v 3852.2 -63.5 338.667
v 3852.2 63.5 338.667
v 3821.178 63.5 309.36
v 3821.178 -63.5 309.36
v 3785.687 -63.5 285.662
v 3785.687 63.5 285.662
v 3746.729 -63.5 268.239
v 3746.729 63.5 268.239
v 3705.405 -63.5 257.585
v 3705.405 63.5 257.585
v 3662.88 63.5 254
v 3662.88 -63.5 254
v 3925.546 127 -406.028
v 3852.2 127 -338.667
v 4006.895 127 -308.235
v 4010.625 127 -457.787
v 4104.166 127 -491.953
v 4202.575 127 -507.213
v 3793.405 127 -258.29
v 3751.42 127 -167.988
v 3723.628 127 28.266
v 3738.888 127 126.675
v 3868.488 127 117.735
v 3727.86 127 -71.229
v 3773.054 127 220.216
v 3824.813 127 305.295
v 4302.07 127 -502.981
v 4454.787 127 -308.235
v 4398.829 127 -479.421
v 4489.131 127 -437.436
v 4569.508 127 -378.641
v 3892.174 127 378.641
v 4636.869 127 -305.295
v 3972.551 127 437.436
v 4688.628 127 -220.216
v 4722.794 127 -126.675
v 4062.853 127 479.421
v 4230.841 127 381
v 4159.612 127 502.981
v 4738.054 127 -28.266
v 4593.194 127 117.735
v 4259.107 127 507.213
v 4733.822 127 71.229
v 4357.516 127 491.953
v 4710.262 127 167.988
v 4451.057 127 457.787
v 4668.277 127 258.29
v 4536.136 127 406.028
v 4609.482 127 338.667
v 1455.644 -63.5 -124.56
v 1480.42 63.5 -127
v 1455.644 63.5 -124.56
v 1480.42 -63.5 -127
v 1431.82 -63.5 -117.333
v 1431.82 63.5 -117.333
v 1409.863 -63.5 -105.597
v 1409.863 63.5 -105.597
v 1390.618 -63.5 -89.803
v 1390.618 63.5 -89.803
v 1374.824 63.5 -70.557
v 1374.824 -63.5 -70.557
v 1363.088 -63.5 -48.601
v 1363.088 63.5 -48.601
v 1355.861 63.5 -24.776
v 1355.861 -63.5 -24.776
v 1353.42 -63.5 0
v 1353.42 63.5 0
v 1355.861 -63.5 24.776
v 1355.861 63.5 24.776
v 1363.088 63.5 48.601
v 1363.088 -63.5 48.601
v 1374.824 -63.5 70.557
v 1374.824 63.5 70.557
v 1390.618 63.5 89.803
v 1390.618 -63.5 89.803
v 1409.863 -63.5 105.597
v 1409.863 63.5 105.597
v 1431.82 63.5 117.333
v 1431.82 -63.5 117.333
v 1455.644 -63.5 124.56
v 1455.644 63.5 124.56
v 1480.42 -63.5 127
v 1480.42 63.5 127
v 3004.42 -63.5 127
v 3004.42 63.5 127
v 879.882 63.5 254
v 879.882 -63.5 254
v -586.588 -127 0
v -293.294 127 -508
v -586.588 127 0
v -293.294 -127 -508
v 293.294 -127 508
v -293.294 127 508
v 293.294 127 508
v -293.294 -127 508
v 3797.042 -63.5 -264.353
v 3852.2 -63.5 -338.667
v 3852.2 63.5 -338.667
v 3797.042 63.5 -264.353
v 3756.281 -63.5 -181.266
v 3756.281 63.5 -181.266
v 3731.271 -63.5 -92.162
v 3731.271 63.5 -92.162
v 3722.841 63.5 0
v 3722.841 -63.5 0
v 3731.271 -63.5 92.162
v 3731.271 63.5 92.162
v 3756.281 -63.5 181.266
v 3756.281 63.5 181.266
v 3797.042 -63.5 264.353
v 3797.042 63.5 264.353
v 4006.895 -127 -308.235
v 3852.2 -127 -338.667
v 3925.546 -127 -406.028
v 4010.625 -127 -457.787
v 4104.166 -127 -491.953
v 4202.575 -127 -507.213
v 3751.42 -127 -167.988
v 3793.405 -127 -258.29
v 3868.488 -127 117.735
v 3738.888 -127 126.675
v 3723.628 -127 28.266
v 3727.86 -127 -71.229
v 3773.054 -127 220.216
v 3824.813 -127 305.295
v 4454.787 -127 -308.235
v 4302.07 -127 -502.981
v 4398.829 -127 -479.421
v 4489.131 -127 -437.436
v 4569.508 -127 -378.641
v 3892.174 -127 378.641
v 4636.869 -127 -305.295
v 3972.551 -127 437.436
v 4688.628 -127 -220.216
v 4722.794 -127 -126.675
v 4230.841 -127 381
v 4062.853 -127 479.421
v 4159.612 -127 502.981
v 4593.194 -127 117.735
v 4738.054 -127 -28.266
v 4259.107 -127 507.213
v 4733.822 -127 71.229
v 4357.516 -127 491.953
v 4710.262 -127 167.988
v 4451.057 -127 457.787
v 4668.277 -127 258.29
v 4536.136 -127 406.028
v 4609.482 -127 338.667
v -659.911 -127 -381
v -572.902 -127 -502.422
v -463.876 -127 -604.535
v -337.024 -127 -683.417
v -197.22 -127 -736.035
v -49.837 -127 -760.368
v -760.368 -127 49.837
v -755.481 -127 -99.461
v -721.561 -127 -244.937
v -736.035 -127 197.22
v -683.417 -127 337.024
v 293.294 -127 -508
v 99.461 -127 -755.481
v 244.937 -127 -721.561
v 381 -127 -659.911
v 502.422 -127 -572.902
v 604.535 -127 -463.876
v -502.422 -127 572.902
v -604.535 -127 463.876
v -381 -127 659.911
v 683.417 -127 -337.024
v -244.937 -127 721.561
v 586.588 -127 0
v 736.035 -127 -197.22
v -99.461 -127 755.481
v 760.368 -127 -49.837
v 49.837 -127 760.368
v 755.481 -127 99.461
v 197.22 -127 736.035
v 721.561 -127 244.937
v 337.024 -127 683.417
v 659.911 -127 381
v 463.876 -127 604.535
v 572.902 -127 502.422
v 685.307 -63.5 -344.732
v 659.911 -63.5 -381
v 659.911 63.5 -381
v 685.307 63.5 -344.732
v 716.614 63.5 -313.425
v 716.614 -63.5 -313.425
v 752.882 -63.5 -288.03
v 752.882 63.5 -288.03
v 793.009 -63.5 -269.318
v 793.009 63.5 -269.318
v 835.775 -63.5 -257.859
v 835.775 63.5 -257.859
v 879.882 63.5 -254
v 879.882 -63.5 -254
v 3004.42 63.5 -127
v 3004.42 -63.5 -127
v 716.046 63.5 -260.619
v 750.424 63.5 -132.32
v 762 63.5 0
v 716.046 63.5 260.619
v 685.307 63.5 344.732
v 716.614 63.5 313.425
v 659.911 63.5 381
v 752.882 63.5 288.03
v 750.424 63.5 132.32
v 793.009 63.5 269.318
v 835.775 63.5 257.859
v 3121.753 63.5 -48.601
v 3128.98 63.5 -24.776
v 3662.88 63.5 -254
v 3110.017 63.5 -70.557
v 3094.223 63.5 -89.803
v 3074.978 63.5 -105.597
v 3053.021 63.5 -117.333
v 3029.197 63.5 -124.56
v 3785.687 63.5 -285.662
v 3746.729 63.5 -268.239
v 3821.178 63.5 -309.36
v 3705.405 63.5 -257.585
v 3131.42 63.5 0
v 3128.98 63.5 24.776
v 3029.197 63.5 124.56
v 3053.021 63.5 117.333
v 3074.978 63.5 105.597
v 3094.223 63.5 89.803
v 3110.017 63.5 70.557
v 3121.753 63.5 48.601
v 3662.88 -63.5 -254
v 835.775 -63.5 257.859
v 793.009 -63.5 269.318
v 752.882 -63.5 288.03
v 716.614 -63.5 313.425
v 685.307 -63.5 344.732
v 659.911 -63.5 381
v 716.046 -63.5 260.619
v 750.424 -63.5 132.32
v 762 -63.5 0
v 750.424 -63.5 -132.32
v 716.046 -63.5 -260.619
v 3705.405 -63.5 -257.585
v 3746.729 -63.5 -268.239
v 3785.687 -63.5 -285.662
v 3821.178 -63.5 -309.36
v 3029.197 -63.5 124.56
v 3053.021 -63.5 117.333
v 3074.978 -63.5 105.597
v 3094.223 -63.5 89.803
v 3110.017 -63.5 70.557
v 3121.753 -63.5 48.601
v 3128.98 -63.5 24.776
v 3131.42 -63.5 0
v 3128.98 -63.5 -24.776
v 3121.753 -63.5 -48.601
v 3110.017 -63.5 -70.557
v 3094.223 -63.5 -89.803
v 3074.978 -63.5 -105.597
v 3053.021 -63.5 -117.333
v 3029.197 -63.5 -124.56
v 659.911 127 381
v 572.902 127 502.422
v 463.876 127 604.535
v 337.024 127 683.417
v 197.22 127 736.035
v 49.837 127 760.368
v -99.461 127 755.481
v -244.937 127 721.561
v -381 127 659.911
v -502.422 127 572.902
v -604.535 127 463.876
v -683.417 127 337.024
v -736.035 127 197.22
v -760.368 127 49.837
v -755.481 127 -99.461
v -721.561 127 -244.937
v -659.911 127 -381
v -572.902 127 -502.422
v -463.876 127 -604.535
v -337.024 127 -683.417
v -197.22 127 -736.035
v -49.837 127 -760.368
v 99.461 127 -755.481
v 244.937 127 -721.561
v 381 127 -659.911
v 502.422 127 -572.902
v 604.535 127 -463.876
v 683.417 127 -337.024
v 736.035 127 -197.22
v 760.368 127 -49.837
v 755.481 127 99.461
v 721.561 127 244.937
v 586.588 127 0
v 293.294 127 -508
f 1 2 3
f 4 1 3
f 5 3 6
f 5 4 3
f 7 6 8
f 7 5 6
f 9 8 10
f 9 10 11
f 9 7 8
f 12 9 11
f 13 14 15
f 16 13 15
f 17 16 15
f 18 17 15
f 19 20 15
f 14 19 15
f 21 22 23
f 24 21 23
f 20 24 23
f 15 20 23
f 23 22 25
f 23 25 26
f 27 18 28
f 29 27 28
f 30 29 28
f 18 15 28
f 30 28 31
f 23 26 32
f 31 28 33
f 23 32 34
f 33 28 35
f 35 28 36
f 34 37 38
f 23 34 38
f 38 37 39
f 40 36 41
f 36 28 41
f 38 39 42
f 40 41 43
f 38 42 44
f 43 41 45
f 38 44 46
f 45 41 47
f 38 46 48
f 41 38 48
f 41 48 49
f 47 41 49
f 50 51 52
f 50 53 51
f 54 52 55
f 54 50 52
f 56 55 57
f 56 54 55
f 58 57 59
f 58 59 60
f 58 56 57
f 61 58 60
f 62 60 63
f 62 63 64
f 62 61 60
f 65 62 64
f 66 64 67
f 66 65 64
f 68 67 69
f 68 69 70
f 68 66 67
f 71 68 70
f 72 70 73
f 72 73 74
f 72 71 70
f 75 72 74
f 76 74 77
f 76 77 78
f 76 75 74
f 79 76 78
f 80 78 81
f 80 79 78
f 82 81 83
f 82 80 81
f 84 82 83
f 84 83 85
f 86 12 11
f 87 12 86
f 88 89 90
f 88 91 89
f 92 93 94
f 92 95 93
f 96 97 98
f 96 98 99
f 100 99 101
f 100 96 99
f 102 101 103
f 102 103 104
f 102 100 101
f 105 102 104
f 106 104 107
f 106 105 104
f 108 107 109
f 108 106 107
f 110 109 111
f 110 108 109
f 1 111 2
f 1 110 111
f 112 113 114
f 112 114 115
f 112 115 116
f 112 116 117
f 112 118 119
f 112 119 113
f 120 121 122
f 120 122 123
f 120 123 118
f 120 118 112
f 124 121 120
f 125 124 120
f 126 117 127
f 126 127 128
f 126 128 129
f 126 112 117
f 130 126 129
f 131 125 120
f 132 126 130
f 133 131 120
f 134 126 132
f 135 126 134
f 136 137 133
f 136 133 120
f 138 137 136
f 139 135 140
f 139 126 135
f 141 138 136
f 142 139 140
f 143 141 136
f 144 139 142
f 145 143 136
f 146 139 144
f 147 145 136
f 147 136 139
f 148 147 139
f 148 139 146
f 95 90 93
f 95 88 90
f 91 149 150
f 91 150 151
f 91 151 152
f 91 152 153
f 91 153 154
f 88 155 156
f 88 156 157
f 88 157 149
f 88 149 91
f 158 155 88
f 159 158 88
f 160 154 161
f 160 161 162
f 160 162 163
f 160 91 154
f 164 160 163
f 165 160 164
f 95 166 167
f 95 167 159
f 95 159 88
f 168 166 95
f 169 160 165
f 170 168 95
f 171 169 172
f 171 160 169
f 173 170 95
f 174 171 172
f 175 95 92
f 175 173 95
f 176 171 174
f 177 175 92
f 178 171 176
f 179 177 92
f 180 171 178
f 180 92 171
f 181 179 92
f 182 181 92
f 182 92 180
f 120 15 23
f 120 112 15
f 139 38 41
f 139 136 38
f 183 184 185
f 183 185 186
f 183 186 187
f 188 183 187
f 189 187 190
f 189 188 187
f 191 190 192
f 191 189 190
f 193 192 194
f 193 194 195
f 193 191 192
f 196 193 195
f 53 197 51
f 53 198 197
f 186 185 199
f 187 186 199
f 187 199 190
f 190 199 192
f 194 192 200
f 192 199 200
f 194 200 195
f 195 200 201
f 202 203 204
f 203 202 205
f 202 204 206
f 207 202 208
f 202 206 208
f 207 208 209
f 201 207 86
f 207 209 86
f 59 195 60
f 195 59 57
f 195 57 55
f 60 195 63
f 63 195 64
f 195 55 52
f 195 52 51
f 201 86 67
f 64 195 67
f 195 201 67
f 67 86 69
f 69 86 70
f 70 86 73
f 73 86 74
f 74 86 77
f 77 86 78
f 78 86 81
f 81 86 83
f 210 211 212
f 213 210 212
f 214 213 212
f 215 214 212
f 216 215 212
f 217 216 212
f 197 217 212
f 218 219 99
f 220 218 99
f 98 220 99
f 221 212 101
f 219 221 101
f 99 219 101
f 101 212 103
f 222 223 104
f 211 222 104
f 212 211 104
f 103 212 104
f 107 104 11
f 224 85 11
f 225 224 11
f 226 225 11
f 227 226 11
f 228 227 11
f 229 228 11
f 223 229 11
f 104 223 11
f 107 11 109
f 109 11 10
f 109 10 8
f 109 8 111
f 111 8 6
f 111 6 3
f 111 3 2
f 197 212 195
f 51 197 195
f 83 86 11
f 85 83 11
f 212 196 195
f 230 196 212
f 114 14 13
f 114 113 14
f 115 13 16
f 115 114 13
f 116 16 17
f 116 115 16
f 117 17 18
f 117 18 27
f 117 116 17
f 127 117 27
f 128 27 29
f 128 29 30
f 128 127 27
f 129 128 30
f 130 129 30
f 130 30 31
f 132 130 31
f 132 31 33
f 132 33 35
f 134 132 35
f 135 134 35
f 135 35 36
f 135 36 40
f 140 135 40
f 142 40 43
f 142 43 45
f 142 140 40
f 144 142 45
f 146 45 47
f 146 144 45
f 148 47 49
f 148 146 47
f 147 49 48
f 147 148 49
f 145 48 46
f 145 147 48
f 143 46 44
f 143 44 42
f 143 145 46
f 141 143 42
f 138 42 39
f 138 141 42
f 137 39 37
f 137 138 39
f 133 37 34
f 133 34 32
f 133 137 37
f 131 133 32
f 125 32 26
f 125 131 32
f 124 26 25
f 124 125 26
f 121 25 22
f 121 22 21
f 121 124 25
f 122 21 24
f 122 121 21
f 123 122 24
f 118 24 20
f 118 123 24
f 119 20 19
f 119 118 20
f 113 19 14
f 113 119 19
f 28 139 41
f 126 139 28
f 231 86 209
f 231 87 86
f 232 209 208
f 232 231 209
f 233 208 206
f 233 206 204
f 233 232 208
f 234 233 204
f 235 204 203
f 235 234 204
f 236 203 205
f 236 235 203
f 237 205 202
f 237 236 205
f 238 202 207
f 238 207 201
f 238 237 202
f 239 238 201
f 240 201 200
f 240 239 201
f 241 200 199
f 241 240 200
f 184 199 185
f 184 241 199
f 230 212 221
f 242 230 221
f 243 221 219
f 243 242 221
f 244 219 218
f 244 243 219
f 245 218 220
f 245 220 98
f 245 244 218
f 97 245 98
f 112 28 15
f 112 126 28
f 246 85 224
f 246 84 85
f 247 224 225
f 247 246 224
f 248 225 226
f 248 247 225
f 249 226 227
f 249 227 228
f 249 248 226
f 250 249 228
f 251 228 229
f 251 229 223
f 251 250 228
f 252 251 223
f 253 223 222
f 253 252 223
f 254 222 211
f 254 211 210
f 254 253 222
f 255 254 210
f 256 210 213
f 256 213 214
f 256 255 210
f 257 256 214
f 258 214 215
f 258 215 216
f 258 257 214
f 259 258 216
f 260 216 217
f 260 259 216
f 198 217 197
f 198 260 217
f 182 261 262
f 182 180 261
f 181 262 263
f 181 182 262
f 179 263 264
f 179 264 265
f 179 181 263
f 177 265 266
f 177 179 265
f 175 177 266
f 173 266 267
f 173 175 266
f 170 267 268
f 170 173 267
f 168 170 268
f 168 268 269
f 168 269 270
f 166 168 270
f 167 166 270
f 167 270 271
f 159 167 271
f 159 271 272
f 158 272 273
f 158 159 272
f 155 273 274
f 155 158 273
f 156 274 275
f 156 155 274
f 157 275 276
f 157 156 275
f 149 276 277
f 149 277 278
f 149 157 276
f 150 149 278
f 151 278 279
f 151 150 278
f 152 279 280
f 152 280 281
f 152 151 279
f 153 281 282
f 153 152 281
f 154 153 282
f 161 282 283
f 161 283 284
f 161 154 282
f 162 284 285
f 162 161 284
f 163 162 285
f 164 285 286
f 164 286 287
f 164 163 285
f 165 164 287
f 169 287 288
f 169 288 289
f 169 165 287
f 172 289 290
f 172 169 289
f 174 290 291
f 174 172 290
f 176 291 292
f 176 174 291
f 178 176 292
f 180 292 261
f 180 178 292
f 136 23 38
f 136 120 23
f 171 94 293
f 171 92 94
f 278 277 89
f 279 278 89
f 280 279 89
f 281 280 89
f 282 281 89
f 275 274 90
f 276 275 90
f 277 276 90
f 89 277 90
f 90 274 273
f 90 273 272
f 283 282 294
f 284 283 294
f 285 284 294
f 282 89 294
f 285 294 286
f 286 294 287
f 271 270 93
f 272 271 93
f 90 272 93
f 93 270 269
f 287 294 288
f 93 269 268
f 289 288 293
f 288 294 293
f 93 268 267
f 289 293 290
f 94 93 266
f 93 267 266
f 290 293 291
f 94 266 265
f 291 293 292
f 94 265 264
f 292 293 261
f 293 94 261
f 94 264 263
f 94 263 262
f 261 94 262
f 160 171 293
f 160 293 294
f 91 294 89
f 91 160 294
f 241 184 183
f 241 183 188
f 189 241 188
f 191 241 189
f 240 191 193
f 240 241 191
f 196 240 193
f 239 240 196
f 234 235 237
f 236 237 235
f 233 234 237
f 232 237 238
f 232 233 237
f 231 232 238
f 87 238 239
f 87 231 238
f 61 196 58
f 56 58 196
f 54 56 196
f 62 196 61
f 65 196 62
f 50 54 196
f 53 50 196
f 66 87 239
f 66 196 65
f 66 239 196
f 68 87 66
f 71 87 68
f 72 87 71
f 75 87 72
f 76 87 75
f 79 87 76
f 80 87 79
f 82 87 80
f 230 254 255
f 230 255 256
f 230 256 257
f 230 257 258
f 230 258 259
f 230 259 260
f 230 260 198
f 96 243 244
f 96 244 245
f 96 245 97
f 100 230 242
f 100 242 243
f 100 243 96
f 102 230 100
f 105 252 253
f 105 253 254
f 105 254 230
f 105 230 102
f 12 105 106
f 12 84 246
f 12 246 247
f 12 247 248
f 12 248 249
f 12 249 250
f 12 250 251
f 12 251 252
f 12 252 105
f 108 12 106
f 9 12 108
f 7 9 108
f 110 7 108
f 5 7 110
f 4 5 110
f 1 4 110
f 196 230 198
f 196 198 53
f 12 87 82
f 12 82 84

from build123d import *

# Parameters (mm, degrees)
F1_DEPTH = 127
F2_DEPTH = 127
F3_DEPTH = 63.5


with BuildPart() as f1:
    # F0 (on Front) → F1 (new body, symmetric)
    with BuildSketch(Plane.XZ):
        with BuildLine():
            ThreePointArc((659.9113576837, -381), (736.0354796323, -197.2201123681), (762, 0))
            ThreePointArc((762, 0), (736.0354796323, 197.2201123681), (659.9113576837, 381))
            ThreePointArc((659.9113576837, 381), (-762, 0), (659.9113576837, -381))
        make_face()
        Polygon((586.5878734967, 0), (293.2939367483, -508), (-293.2939367483, -508), (-586.5878734967, 0), (-293.2939367483, 508), (293.2939367483, 508), align=None, mode=Mode.SUBTRACT)
    extrude(amount=F1_DEPTH, both=True)


with BuildPart() as f2:
    # F0 (on Front) → F2 (new body, symmetric)
    with BuildSketch(Plane.XZ):
        with BuildLine():
            ThreePointArc((4738.8409793711, 0), (4412.1066009758, 474.5595583531), (3852.2001351811, 338.6666666667))
            ThreePointArc((3852.2001351811, 338.6666666667), (3722.8409793711, 0), (3852.2001351811, -338.6666666667))
            ThreePointArc((3852.2001351811, -338.6666666667), (4412.1066009758, -474.5595583531), (4738.8409793711, 0))
        make_face()
        Polygon((4593.1935120795, 117.7354748569), (4454.7871604945, -308.2354748569), (4006.8947982476, -308.2354748569), (3868.4884466626, 117.7354748569), (4230.8409793711, 381), align=None, mode=Mode.SUBTRACT)
    extrude(amount=F2_DEPTH, both=True)


with BuildPart() as f3:
    # F0 (on Front) → F3 (new body, symmetric)
    with BuildSketch(Plane.XZ):
        with BuildLine():
            ThreePointArc((659.9113576837, 381), (736.0354796323, 197.2201123681), (762, 0))
            ThreePointArc((762, 0), (736.0354796323, -197.2201123681), (659.9113576837, -381))
            ThreePointArc((659.9113576837, -381), (752.881810245, -288.0295474388), (879.881810245, -254))
            Line((879.881810245, -254), (2242.4204896855, -254))
            Line((2242.4204896855, -254), (3662.8797130861, -254))
            ThreePointArc((3662.8797130861, -254), (3766.5747788639, -276.1307839895), (3852.2001351811, -338.6666666667))
            ThreePointArc((3852.2001351811, -338.6666666667), (3722.8409793711, 0), (3852.2001351811, 338.6666666667))
            ThreePointArc((3852.2001351811, 338.6666666667), (3766.5747788639, 276.1307839895), (3662.8797130861, 254))
            Line((3662.8797130861, 254), (2242.4204896855, 254))
            Line((2242.4204896855, 254), (879.881810245, 254))
            ThreePointArc((879.881810245, 254), (752.881810245, 288.0295474388), (659.9113576837, 381))
        make_face()
        with BuildLine():
            Line((1480.4204896855, 127), (2242.4204896855, 127))
            Line((2242.4204896855, 127), (3004.4204896855, 127))
            ThreePointArc((3004.4204896855, 127), (3131.4204896855, 0), (3004.4204896855, -127))
            Line((3004.4204896855, -127), (1480.4204896855, -127))
            ThreePointArc((1480.4204896855, -127), (1353.4204896855, 0), (1480.4204896855, 127))
        make_face(mode=Mode.SUBTRACT)
    extrude(amount=F3_DEPTH, both=True)


solid = Compound([f1.part, f2.part, f3.part])
